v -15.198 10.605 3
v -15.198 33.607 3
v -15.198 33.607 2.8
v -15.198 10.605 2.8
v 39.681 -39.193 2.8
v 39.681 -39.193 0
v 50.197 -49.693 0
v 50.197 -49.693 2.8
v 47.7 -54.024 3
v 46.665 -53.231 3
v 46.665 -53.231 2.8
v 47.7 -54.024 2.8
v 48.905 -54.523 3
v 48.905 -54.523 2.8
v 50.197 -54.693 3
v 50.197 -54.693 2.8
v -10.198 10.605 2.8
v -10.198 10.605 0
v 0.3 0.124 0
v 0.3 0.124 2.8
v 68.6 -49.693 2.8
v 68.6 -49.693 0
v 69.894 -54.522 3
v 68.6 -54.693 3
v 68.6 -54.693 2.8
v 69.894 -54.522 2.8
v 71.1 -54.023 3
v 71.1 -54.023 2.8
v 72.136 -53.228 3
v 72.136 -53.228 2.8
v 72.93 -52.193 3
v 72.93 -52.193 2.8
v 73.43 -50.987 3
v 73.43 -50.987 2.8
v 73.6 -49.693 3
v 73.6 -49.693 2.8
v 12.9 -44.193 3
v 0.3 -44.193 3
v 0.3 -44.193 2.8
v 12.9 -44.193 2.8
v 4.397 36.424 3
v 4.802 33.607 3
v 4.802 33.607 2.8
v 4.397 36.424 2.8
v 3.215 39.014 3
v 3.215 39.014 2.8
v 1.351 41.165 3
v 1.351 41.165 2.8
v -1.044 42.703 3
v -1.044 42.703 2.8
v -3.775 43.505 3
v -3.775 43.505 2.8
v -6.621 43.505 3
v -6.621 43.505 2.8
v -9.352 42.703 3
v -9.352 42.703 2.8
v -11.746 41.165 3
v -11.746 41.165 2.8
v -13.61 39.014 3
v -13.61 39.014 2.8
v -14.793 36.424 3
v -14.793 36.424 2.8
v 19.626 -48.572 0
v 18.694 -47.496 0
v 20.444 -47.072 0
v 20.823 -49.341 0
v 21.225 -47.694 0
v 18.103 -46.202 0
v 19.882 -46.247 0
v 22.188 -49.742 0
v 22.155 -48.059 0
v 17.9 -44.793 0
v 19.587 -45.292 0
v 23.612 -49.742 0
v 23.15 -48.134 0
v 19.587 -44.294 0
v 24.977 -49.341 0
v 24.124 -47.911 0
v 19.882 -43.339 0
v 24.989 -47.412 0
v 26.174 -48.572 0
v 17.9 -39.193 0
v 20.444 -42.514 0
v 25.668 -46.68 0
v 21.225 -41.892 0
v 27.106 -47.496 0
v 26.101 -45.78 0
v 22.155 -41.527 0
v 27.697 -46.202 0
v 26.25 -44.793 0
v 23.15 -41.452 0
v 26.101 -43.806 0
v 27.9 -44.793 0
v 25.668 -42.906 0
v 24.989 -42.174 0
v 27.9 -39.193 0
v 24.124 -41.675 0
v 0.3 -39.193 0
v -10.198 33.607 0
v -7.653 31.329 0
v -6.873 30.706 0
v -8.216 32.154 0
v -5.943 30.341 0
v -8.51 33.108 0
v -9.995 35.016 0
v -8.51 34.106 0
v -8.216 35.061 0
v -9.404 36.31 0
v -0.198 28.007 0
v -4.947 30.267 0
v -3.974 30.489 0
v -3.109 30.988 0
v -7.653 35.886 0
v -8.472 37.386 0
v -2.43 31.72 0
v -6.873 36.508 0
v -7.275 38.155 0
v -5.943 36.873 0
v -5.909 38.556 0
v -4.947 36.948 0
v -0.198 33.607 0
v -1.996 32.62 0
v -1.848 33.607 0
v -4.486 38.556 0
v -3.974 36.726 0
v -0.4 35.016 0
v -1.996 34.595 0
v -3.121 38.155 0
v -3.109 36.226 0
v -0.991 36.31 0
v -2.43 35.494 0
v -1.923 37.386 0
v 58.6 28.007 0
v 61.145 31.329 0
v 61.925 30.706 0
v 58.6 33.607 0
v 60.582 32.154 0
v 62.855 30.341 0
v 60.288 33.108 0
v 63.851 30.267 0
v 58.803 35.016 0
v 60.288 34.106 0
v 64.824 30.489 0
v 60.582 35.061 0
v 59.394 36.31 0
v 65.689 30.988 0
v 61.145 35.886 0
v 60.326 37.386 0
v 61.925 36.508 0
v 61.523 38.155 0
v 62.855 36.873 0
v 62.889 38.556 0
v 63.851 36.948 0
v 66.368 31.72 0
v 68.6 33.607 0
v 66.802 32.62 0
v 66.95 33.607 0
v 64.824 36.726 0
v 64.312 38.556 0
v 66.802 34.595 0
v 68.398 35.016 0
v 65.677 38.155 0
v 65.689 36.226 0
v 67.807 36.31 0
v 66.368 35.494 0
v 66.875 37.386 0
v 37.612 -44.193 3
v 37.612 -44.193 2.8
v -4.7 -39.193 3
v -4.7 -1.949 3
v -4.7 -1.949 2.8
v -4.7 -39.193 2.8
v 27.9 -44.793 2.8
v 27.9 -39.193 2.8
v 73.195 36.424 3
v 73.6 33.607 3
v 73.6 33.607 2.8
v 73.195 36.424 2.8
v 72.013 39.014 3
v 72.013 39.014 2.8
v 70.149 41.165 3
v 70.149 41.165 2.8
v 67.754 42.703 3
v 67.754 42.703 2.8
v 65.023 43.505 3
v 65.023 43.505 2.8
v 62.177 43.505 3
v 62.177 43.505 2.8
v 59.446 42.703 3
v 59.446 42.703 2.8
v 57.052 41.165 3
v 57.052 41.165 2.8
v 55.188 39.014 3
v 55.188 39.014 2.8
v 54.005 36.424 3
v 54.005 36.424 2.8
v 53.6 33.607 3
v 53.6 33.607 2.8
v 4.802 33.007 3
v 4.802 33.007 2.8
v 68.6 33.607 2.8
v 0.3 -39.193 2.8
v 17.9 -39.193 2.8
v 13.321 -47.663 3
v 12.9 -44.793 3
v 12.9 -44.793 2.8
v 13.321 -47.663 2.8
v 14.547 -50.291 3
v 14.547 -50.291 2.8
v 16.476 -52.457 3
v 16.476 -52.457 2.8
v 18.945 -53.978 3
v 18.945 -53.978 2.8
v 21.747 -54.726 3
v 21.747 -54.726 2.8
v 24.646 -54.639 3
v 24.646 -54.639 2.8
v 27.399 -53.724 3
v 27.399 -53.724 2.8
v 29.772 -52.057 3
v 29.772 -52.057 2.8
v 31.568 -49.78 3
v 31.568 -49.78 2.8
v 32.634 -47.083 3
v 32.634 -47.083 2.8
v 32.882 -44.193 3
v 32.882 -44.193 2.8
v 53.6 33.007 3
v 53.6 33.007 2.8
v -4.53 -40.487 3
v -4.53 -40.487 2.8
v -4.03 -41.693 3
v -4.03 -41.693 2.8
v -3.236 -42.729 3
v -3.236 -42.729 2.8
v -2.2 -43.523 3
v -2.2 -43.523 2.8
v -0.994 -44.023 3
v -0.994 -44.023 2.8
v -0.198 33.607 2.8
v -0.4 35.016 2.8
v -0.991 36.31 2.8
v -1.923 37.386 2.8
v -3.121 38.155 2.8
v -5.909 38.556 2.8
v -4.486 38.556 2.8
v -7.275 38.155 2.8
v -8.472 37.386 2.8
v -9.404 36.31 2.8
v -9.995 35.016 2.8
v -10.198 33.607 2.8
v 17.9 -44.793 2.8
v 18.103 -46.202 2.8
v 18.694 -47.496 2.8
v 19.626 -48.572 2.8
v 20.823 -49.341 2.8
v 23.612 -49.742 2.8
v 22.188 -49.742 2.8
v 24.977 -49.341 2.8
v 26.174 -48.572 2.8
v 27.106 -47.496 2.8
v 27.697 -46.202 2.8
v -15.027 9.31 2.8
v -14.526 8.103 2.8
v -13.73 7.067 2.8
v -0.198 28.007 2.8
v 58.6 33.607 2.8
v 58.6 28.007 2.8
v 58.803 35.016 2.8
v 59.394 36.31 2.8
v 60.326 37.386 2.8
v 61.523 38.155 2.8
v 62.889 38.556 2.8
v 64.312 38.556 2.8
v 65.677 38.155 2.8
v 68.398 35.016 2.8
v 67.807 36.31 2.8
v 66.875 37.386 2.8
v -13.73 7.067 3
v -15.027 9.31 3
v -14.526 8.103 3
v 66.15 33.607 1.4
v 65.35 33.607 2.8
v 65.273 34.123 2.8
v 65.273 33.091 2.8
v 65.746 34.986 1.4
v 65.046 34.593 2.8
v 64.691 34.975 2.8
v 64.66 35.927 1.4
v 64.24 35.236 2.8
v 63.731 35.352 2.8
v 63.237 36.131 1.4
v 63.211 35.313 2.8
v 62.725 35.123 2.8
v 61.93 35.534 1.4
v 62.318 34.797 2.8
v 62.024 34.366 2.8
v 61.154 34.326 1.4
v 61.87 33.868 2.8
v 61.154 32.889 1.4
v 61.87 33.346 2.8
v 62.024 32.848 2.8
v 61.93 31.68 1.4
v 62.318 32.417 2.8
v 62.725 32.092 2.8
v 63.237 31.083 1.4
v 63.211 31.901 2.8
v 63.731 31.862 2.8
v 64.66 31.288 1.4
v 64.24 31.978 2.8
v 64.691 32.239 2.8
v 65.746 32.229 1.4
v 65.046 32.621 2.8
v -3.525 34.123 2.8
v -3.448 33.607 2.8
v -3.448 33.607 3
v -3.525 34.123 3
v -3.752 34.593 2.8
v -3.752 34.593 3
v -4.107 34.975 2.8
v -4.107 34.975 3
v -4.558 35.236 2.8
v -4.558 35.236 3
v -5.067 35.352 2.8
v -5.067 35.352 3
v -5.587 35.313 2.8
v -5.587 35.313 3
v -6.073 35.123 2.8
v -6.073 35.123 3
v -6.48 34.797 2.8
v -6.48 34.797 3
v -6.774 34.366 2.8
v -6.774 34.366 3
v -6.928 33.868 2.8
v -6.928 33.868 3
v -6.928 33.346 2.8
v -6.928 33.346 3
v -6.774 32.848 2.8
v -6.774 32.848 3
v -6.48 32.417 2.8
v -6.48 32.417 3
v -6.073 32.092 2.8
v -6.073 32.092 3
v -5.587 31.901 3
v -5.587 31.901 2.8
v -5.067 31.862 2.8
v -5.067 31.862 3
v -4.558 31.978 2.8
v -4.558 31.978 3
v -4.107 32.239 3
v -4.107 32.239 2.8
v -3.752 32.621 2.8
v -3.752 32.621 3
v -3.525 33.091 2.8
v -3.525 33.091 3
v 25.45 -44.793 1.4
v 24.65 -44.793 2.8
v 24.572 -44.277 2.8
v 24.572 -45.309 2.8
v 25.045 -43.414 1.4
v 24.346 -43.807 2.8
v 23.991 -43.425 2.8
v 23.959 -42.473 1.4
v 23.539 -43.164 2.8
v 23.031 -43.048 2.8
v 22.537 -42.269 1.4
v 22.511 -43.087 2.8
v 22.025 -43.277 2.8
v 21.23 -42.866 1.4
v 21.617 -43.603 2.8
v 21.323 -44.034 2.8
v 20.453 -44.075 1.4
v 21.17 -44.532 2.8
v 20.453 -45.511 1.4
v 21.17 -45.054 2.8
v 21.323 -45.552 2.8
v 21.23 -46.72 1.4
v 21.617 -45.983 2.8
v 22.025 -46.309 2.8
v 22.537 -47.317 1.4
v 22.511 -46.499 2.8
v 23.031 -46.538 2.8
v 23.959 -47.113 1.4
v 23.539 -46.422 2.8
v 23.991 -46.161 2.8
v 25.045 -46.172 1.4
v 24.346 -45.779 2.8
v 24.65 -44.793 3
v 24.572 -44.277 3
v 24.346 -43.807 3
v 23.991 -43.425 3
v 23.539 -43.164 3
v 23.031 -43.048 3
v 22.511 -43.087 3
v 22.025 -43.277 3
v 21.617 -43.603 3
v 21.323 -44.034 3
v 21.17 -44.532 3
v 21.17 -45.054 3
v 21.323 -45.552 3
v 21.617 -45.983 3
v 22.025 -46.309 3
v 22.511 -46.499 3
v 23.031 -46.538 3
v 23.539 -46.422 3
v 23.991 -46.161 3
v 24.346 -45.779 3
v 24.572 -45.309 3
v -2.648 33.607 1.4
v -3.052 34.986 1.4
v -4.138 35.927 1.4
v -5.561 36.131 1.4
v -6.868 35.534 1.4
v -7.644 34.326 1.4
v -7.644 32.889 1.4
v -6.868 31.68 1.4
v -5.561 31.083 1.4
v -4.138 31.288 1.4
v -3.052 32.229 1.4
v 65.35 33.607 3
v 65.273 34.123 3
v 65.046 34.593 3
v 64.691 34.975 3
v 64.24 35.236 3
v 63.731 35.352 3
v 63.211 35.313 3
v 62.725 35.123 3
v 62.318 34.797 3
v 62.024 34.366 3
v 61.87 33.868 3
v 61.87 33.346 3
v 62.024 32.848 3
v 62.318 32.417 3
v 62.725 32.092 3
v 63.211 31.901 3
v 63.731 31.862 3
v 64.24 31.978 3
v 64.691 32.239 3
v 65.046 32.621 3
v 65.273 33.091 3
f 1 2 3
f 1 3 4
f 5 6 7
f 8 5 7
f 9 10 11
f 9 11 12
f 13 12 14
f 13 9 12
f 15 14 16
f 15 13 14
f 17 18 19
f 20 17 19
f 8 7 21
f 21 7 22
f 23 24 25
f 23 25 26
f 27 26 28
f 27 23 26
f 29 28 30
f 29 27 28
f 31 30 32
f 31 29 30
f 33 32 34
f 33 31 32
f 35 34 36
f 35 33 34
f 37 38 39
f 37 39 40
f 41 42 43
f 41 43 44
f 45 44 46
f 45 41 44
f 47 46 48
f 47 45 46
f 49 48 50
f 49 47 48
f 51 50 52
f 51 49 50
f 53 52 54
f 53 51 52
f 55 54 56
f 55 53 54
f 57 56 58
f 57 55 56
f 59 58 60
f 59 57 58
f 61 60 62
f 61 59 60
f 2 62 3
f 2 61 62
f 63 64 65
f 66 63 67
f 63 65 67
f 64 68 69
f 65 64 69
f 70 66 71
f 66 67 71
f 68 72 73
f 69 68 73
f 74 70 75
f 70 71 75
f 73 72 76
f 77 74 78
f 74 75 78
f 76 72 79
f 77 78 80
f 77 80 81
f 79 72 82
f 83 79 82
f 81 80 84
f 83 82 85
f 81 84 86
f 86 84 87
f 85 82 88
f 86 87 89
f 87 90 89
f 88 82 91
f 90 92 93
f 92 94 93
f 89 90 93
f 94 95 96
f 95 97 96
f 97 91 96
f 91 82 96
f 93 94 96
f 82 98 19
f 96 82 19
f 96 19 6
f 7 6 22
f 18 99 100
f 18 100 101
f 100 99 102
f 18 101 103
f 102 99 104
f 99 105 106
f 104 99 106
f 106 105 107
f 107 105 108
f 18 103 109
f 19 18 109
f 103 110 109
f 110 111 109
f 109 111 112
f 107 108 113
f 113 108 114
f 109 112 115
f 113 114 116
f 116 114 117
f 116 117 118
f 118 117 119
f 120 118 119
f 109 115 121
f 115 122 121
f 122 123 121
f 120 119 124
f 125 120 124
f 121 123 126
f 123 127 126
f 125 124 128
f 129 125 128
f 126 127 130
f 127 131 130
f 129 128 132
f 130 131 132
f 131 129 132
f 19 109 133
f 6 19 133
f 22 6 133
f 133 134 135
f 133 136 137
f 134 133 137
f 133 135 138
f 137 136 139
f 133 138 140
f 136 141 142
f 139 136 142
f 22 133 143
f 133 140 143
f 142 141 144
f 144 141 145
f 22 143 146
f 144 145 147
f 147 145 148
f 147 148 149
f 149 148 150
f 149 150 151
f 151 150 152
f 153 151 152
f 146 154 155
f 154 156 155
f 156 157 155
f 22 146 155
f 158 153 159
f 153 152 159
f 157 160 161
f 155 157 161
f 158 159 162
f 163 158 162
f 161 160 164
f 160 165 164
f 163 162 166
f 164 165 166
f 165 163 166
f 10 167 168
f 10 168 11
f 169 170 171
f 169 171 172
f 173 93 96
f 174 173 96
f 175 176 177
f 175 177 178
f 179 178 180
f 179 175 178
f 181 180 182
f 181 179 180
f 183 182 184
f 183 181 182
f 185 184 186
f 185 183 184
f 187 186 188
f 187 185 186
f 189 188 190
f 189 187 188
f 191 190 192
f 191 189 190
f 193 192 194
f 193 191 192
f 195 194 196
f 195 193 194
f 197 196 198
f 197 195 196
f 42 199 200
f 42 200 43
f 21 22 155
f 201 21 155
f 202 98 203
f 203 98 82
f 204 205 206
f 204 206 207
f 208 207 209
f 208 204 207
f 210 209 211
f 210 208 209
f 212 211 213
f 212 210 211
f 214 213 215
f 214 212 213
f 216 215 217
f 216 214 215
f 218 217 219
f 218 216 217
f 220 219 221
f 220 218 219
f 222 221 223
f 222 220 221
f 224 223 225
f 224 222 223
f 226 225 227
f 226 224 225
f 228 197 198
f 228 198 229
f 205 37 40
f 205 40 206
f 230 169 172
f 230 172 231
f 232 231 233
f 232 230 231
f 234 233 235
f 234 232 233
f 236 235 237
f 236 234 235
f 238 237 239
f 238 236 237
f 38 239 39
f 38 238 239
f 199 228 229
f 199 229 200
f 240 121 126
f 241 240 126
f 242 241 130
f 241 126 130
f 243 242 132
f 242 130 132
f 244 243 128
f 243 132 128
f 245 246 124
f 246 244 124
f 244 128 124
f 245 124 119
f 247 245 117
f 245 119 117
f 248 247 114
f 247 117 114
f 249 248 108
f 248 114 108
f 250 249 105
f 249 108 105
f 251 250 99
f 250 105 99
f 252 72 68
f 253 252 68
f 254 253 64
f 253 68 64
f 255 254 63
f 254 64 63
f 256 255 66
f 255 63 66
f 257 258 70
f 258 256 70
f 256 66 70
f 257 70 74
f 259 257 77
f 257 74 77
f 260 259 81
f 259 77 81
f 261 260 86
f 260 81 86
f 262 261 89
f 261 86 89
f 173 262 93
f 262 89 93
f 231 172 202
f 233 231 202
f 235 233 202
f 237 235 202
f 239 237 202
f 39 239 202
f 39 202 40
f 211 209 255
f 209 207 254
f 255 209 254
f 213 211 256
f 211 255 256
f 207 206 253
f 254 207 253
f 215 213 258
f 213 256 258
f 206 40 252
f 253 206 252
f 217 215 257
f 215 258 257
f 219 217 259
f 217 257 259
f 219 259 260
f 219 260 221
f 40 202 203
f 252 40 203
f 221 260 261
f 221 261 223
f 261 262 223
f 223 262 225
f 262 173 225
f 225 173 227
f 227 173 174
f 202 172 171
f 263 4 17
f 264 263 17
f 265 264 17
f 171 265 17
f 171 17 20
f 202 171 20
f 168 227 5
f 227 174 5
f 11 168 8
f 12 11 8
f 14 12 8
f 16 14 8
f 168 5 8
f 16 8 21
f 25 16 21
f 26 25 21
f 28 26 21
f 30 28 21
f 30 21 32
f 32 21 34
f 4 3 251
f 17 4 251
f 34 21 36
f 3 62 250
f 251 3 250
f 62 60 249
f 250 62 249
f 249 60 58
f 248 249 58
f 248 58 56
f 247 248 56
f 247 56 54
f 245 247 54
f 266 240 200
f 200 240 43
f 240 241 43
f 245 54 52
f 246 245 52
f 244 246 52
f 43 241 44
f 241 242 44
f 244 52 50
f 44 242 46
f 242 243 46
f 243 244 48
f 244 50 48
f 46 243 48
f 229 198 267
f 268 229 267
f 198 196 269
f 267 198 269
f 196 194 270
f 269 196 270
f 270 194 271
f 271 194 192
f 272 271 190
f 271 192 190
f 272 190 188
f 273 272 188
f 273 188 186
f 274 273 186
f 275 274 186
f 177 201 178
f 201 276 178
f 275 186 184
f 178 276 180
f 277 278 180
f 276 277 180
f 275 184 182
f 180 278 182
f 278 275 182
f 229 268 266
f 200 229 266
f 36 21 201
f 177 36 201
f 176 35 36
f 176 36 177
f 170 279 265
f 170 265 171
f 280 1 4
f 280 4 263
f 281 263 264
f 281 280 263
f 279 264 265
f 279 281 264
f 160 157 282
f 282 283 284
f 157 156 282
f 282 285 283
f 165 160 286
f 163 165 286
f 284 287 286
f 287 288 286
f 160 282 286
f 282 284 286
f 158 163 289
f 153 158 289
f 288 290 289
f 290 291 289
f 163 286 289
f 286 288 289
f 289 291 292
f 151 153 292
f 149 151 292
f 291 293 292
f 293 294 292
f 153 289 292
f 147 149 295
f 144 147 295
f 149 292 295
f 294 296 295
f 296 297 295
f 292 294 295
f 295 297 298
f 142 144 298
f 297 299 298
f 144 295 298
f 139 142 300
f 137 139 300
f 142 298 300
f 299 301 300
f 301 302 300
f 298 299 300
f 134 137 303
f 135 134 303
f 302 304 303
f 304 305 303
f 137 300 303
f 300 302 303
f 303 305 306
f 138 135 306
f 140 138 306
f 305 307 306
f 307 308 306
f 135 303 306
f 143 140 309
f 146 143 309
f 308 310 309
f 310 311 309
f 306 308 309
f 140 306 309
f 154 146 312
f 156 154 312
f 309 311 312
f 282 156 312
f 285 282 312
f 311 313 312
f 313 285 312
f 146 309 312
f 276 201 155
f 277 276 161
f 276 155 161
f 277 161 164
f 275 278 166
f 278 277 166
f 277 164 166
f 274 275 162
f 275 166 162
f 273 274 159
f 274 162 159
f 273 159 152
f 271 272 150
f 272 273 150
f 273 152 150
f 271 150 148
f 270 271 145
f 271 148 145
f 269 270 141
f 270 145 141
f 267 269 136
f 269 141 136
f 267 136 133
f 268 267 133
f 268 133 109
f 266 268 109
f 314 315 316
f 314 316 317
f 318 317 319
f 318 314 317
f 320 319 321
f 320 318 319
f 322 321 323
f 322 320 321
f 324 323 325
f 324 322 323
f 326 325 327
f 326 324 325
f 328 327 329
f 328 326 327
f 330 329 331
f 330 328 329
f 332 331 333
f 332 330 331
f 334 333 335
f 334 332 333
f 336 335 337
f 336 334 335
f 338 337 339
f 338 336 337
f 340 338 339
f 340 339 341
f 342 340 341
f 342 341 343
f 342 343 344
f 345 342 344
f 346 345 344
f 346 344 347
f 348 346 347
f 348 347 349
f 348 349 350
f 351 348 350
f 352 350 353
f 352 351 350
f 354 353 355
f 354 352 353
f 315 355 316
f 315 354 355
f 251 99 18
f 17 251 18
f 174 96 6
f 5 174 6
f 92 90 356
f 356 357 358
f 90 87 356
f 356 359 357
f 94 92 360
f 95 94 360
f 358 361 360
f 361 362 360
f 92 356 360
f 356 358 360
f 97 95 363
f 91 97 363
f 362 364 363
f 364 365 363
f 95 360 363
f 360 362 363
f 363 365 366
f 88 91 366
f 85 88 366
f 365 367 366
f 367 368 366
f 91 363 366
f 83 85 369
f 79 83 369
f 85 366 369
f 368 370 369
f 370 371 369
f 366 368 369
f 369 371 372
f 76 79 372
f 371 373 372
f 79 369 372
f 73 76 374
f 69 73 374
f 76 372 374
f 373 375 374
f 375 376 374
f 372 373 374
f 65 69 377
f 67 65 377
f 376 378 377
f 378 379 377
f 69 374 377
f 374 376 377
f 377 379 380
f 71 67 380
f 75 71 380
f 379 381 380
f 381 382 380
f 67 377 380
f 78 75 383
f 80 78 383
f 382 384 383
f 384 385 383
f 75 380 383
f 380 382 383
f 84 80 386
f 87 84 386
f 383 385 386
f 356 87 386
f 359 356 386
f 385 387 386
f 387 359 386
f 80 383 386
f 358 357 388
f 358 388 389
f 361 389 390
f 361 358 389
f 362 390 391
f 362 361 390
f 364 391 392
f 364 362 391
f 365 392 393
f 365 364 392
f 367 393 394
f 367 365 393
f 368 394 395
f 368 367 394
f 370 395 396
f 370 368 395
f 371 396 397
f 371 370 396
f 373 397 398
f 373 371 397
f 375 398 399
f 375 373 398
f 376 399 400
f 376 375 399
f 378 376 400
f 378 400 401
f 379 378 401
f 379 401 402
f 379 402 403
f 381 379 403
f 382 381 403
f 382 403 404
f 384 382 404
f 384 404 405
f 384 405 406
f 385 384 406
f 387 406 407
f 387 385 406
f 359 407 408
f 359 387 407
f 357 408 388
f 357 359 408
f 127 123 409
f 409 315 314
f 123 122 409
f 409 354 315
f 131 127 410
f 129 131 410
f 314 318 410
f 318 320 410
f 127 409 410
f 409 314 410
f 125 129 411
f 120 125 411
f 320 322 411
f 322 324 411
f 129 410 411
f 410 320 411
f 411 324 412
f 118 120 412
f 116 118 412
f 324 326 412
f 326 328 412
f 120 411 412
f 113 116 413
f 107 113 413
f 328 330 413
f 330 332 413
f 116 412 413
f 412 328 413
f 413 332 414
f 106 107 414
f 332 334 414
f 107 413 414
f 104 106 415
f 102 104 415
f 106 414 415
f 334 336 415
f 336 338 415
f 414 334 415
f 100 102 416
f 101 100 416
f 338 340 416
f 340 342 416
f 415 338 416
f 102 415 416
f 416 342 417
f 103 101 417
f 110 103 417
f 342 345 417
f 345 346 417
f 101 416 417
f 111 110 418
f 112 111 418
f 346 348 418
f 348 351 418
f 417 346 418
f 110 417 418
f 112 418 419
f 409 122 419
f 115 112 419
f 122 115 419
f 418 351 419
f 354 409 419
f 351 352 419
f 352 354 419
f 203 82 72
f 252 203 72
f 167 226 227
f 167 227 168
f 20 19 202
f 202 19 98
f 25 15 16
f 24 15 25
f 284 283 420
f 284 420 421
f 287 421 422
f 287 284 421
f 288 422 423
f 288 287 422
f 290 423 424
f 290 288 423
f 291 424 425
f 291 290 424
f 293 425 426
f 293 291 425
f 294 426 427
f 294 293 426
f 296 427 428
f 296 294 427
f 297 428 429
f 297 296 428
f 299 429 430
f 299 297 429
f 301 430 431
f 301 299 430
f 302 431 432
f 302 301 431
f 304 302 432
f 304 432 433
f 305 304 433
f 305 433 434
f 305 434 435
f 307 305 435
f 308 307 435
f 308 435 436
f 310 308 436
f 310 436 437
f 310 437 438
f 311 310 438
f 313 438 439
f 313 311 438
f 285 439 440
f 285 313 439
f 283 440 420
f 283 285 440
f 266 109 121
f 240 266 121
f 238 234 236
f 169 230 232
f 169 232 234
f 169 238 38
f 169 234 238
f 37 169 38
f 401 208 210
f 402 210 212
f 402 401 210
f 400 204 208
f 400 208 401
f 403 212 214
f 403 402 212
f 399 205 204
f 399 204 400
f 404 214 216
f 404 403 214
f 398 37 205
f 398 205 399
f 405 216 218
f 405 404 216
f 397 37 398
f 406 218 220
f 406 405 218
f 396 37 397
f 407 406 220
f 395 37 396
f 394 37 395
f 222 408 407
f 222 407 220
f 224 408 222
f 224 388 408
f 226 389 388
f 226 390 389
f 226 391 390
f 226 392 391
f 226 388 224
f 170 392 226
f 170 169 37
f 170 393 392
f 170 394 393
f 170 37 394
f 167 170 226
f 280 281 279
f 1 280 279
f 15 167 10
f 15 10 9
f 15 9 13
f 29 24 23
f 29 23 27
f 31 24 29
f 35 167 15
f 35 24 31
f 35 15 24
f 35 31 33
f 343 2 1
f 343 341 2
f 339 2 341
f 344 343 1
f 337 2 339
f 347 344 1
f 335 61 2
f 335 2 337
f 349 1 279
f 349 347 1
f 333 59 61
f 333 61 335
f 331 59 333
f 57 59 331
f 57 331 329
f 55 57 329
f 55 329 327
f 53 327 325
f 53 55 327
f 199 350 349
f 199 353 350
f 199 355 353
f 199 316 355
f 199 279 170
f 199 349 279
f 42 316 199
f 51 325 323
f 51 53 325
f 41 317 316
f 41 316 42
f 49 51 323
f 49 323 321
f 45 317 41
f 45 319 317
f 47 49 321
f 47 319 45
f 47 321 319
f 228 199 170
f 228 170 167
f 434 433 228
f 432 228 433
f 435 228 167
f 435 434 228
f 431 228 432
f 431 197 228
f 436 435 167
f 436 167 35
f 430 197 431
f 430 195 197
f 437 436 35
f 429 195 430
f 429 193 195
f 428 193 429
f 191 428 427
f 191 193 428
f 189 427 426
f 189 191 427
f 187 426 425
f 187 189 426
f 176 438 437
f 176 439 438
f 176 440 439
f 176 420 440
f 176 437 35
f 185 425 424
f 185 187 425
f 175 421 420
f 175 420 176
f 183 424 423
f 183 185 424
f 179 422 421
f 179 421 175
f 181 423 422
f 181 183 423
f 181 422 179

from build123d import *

# Parameters (mm, degrees)
F0_R     = 1.75
F1_DEPTH = 3
F2_SIZE2 = 2.8
F2_SIZE  = 1.6
F4_DEPTH = 0.2


with BuildPart() as f1:
    # F0 (on Top) → F1 (new body)
    with BuildSketch(Plane.XY):
        with BuildLine():
            Line((17.9, -39.193), (17.9, -44.793))
            ThreePointArc((17.9, -44.793), (22.9, -49.793), (27.9, -44.793))
            Line((27.9, -44.793), (27.9, -39.193))
            Line((27.9, -39.193), (39.6807047181, -39.193))
            Line((39.6807047181, -39.193), (50.1974673469, -49.6928583233))
            Line((50.1974673469, -49.6928583233), (68.6003446043, -49.6928583233))
            Line((68.6003446043, -49.6928583233), (68.6003446043, 33.6071416767))
            ThreePointArc((68.6003446043, 33.6071416767), (63.6003446043, 38.6071416767), (58.6003446043, 33.6071416767))
            Line((58.6003446043, 33.6071416767), (58.6003446043, 28.0071416767))
            Line((58.6003446043, 28.0071416767), (-0.1976553957, 28.0071416767))
            Line((-0.1976553957, 28.0071416767), (-0.1976553957, 33.6071416767))
            ThreePointArc((-0.1976553957, 33.6071416767), (-5.1976553957, 38.6071416767), (-10.1976553957, 33.6071416767))
            Line((-10.1976553957, 33.6071416767), (-10.1976553957, 10.6051872446))
            Line((-10.1976553957, 10.6051872446), (0.3, 0.124405442))
            Line((0.3, 0.124405442), (0.3, -39.193))
            Line((0.3, -39.193), (17.9, -39.193))
        make_face()
        with Locations((22.9, -44.793)):
            Circle(F0_R, mode=Mode.SUBTRACT)
        with Locations((-5.1976553957, 33.6071416767)):
            Circle(F0_R, mode=Mode.SUBTRACT)
        with Locations((63.6003446043, 33.6071416767)):
            Circle(F0_R, mode=Mode.SUBTRACT)
    extrude(amount=F1_DEPTH)

    # F2
    f2_edges = [f1.edges().sort_by_distance(p)[0] for p in [
        (21.15, -44.793, 0),
        (-6.947655, 33.607142, 0),
        (61.850345, 33.607142, 0),
    ]]
    f2_side = f1.faces().sort_by_distance((33.388783, -5.784916, 0))[0]
    chamfer(f2_edges, length=F2_SIZE, length2=F2_SIZE2, reference=f2_side)

    # F3 (on face) → F4 (join)
    with BuildSketch(Plane.XY.offset(3)):
        with BuildLine():
            ThreePointArc((4.8023446043, 33.6071416767), (-5.1976553957, 43.6071416767), (-15.1976553957, 33.6071416767))
            Line((-15.1976553957, 33.6071416767), (-15.1976553957, 10.6051872446))
            ThreePointArc((-15.1976553957, 10.6051872446), (-14.8162831751, 8.6899124771), (-13.7303444218, 7.0668107461))
            Line((-13.7303444218, 7.0668107461), (-4.7, -1.949018591))
            Line((-4.7, -1.949018591), (-4.7, -39.193))
            ThreePointArc((-4.7, -39.193), (-3.2355339059, -42.7285339059), (0.3, -44.193))
            Line((0.3, -44.193), (12.9, -44.193))
            Line((12.9, -44.193), (12.9, -44.793))
            ThreePointArc((12.9, -44.793), (23.2001352131, -54.7884949279), (32.8819837708, -44.193))
            Line((32.8819837708, -44.193), (37.6119923424, -44.193))
            Line((37.6119923424, -44.193), (46.6647783208, -53.2312348218))
            ThreePointArc((46.6647783208, -53.2312348218), (48.2859081001, -54.3130251219), (50.1974673469, -54.6928583233))
            Line((50.1974673469, -54.6928583233), (68.6003446043, -54.6928583233))
            ThreePointArc((68.6003446043, -54.6928583233), (72.1358785102, -53.2283922293), (73.6003446043, -49.6928583233))
            Line((73.6003446043, -49.6928583233), (73.6003446043, 33.6071416767))
            ThreePointArc((73.6003446043, 33.6071416767), (63.6003446043, 43.6071416767), (53.6003446043, 33.6071416767))
            Line((53.6003446043, 33.6071416767), (53.6003446043, 33.0071416767))
            Line((53.6003446043, 33.0071416767), (4.8023446043, 33.0071416767))
            Line((4.8023446043, 33.0071416767), (4.8023446043, 33.6071416767))
        make_face()
        with BuildLine():
            Line((0.3, 0.124405442), (-10.1976553957, 10.6051872446))
            Line((-10.1976553957, 10.6051872446), (-10.1976553957, 33.6071416767))
            ThreePointArc((-10.1976553957, 33.6071416767), (-5.1976553957, 38.6071416767), (-0.1976553957, 33.6071416767))
            Line((-0.1976553957, 33.6071416767), (-0.1976553957, 28.0071416767))
            Line((-0.1976553957, 28.0071416767), (58.6003446043, 28.0071416767))
            Line((58.6003446043, 28.0071416767), (58.6003446043, 33.6071416767))
            ThreePointArc((58.6003446043, 33.6071416767), (63.6003446043, 38.6071416767), (68.6003446043, 33.6071416767))
            Line((68.6003446043, 33.6071416767), (68.6003446043, -49.6928583233))
            Line((68.6003446043, -49.6928583233), (50.1974673469, -49.6928583233))
            Line((50.1974673469, -49.6928583233), (39.6807047181, -39.193))
            Line((39.6807047181, -39.193), (27.9, -39.193))
            Line((27.9, -39.193), (27.9, -44.793))
            ThreePointArc((27.9, -44.793), (22.9, -49.793), (17.9, -44.793))
            Line((17.9, -44.793), (17.9, -39.193))
            Line((17.9, -39.193), (0.3, -39.193))
            Line((0.3, -39.193), (0.3, 0.124405442))
        make_face(mode=Mode.SUBTRACT)
    extrude(amount=-F4_DEPTH)


solid = f1.part
